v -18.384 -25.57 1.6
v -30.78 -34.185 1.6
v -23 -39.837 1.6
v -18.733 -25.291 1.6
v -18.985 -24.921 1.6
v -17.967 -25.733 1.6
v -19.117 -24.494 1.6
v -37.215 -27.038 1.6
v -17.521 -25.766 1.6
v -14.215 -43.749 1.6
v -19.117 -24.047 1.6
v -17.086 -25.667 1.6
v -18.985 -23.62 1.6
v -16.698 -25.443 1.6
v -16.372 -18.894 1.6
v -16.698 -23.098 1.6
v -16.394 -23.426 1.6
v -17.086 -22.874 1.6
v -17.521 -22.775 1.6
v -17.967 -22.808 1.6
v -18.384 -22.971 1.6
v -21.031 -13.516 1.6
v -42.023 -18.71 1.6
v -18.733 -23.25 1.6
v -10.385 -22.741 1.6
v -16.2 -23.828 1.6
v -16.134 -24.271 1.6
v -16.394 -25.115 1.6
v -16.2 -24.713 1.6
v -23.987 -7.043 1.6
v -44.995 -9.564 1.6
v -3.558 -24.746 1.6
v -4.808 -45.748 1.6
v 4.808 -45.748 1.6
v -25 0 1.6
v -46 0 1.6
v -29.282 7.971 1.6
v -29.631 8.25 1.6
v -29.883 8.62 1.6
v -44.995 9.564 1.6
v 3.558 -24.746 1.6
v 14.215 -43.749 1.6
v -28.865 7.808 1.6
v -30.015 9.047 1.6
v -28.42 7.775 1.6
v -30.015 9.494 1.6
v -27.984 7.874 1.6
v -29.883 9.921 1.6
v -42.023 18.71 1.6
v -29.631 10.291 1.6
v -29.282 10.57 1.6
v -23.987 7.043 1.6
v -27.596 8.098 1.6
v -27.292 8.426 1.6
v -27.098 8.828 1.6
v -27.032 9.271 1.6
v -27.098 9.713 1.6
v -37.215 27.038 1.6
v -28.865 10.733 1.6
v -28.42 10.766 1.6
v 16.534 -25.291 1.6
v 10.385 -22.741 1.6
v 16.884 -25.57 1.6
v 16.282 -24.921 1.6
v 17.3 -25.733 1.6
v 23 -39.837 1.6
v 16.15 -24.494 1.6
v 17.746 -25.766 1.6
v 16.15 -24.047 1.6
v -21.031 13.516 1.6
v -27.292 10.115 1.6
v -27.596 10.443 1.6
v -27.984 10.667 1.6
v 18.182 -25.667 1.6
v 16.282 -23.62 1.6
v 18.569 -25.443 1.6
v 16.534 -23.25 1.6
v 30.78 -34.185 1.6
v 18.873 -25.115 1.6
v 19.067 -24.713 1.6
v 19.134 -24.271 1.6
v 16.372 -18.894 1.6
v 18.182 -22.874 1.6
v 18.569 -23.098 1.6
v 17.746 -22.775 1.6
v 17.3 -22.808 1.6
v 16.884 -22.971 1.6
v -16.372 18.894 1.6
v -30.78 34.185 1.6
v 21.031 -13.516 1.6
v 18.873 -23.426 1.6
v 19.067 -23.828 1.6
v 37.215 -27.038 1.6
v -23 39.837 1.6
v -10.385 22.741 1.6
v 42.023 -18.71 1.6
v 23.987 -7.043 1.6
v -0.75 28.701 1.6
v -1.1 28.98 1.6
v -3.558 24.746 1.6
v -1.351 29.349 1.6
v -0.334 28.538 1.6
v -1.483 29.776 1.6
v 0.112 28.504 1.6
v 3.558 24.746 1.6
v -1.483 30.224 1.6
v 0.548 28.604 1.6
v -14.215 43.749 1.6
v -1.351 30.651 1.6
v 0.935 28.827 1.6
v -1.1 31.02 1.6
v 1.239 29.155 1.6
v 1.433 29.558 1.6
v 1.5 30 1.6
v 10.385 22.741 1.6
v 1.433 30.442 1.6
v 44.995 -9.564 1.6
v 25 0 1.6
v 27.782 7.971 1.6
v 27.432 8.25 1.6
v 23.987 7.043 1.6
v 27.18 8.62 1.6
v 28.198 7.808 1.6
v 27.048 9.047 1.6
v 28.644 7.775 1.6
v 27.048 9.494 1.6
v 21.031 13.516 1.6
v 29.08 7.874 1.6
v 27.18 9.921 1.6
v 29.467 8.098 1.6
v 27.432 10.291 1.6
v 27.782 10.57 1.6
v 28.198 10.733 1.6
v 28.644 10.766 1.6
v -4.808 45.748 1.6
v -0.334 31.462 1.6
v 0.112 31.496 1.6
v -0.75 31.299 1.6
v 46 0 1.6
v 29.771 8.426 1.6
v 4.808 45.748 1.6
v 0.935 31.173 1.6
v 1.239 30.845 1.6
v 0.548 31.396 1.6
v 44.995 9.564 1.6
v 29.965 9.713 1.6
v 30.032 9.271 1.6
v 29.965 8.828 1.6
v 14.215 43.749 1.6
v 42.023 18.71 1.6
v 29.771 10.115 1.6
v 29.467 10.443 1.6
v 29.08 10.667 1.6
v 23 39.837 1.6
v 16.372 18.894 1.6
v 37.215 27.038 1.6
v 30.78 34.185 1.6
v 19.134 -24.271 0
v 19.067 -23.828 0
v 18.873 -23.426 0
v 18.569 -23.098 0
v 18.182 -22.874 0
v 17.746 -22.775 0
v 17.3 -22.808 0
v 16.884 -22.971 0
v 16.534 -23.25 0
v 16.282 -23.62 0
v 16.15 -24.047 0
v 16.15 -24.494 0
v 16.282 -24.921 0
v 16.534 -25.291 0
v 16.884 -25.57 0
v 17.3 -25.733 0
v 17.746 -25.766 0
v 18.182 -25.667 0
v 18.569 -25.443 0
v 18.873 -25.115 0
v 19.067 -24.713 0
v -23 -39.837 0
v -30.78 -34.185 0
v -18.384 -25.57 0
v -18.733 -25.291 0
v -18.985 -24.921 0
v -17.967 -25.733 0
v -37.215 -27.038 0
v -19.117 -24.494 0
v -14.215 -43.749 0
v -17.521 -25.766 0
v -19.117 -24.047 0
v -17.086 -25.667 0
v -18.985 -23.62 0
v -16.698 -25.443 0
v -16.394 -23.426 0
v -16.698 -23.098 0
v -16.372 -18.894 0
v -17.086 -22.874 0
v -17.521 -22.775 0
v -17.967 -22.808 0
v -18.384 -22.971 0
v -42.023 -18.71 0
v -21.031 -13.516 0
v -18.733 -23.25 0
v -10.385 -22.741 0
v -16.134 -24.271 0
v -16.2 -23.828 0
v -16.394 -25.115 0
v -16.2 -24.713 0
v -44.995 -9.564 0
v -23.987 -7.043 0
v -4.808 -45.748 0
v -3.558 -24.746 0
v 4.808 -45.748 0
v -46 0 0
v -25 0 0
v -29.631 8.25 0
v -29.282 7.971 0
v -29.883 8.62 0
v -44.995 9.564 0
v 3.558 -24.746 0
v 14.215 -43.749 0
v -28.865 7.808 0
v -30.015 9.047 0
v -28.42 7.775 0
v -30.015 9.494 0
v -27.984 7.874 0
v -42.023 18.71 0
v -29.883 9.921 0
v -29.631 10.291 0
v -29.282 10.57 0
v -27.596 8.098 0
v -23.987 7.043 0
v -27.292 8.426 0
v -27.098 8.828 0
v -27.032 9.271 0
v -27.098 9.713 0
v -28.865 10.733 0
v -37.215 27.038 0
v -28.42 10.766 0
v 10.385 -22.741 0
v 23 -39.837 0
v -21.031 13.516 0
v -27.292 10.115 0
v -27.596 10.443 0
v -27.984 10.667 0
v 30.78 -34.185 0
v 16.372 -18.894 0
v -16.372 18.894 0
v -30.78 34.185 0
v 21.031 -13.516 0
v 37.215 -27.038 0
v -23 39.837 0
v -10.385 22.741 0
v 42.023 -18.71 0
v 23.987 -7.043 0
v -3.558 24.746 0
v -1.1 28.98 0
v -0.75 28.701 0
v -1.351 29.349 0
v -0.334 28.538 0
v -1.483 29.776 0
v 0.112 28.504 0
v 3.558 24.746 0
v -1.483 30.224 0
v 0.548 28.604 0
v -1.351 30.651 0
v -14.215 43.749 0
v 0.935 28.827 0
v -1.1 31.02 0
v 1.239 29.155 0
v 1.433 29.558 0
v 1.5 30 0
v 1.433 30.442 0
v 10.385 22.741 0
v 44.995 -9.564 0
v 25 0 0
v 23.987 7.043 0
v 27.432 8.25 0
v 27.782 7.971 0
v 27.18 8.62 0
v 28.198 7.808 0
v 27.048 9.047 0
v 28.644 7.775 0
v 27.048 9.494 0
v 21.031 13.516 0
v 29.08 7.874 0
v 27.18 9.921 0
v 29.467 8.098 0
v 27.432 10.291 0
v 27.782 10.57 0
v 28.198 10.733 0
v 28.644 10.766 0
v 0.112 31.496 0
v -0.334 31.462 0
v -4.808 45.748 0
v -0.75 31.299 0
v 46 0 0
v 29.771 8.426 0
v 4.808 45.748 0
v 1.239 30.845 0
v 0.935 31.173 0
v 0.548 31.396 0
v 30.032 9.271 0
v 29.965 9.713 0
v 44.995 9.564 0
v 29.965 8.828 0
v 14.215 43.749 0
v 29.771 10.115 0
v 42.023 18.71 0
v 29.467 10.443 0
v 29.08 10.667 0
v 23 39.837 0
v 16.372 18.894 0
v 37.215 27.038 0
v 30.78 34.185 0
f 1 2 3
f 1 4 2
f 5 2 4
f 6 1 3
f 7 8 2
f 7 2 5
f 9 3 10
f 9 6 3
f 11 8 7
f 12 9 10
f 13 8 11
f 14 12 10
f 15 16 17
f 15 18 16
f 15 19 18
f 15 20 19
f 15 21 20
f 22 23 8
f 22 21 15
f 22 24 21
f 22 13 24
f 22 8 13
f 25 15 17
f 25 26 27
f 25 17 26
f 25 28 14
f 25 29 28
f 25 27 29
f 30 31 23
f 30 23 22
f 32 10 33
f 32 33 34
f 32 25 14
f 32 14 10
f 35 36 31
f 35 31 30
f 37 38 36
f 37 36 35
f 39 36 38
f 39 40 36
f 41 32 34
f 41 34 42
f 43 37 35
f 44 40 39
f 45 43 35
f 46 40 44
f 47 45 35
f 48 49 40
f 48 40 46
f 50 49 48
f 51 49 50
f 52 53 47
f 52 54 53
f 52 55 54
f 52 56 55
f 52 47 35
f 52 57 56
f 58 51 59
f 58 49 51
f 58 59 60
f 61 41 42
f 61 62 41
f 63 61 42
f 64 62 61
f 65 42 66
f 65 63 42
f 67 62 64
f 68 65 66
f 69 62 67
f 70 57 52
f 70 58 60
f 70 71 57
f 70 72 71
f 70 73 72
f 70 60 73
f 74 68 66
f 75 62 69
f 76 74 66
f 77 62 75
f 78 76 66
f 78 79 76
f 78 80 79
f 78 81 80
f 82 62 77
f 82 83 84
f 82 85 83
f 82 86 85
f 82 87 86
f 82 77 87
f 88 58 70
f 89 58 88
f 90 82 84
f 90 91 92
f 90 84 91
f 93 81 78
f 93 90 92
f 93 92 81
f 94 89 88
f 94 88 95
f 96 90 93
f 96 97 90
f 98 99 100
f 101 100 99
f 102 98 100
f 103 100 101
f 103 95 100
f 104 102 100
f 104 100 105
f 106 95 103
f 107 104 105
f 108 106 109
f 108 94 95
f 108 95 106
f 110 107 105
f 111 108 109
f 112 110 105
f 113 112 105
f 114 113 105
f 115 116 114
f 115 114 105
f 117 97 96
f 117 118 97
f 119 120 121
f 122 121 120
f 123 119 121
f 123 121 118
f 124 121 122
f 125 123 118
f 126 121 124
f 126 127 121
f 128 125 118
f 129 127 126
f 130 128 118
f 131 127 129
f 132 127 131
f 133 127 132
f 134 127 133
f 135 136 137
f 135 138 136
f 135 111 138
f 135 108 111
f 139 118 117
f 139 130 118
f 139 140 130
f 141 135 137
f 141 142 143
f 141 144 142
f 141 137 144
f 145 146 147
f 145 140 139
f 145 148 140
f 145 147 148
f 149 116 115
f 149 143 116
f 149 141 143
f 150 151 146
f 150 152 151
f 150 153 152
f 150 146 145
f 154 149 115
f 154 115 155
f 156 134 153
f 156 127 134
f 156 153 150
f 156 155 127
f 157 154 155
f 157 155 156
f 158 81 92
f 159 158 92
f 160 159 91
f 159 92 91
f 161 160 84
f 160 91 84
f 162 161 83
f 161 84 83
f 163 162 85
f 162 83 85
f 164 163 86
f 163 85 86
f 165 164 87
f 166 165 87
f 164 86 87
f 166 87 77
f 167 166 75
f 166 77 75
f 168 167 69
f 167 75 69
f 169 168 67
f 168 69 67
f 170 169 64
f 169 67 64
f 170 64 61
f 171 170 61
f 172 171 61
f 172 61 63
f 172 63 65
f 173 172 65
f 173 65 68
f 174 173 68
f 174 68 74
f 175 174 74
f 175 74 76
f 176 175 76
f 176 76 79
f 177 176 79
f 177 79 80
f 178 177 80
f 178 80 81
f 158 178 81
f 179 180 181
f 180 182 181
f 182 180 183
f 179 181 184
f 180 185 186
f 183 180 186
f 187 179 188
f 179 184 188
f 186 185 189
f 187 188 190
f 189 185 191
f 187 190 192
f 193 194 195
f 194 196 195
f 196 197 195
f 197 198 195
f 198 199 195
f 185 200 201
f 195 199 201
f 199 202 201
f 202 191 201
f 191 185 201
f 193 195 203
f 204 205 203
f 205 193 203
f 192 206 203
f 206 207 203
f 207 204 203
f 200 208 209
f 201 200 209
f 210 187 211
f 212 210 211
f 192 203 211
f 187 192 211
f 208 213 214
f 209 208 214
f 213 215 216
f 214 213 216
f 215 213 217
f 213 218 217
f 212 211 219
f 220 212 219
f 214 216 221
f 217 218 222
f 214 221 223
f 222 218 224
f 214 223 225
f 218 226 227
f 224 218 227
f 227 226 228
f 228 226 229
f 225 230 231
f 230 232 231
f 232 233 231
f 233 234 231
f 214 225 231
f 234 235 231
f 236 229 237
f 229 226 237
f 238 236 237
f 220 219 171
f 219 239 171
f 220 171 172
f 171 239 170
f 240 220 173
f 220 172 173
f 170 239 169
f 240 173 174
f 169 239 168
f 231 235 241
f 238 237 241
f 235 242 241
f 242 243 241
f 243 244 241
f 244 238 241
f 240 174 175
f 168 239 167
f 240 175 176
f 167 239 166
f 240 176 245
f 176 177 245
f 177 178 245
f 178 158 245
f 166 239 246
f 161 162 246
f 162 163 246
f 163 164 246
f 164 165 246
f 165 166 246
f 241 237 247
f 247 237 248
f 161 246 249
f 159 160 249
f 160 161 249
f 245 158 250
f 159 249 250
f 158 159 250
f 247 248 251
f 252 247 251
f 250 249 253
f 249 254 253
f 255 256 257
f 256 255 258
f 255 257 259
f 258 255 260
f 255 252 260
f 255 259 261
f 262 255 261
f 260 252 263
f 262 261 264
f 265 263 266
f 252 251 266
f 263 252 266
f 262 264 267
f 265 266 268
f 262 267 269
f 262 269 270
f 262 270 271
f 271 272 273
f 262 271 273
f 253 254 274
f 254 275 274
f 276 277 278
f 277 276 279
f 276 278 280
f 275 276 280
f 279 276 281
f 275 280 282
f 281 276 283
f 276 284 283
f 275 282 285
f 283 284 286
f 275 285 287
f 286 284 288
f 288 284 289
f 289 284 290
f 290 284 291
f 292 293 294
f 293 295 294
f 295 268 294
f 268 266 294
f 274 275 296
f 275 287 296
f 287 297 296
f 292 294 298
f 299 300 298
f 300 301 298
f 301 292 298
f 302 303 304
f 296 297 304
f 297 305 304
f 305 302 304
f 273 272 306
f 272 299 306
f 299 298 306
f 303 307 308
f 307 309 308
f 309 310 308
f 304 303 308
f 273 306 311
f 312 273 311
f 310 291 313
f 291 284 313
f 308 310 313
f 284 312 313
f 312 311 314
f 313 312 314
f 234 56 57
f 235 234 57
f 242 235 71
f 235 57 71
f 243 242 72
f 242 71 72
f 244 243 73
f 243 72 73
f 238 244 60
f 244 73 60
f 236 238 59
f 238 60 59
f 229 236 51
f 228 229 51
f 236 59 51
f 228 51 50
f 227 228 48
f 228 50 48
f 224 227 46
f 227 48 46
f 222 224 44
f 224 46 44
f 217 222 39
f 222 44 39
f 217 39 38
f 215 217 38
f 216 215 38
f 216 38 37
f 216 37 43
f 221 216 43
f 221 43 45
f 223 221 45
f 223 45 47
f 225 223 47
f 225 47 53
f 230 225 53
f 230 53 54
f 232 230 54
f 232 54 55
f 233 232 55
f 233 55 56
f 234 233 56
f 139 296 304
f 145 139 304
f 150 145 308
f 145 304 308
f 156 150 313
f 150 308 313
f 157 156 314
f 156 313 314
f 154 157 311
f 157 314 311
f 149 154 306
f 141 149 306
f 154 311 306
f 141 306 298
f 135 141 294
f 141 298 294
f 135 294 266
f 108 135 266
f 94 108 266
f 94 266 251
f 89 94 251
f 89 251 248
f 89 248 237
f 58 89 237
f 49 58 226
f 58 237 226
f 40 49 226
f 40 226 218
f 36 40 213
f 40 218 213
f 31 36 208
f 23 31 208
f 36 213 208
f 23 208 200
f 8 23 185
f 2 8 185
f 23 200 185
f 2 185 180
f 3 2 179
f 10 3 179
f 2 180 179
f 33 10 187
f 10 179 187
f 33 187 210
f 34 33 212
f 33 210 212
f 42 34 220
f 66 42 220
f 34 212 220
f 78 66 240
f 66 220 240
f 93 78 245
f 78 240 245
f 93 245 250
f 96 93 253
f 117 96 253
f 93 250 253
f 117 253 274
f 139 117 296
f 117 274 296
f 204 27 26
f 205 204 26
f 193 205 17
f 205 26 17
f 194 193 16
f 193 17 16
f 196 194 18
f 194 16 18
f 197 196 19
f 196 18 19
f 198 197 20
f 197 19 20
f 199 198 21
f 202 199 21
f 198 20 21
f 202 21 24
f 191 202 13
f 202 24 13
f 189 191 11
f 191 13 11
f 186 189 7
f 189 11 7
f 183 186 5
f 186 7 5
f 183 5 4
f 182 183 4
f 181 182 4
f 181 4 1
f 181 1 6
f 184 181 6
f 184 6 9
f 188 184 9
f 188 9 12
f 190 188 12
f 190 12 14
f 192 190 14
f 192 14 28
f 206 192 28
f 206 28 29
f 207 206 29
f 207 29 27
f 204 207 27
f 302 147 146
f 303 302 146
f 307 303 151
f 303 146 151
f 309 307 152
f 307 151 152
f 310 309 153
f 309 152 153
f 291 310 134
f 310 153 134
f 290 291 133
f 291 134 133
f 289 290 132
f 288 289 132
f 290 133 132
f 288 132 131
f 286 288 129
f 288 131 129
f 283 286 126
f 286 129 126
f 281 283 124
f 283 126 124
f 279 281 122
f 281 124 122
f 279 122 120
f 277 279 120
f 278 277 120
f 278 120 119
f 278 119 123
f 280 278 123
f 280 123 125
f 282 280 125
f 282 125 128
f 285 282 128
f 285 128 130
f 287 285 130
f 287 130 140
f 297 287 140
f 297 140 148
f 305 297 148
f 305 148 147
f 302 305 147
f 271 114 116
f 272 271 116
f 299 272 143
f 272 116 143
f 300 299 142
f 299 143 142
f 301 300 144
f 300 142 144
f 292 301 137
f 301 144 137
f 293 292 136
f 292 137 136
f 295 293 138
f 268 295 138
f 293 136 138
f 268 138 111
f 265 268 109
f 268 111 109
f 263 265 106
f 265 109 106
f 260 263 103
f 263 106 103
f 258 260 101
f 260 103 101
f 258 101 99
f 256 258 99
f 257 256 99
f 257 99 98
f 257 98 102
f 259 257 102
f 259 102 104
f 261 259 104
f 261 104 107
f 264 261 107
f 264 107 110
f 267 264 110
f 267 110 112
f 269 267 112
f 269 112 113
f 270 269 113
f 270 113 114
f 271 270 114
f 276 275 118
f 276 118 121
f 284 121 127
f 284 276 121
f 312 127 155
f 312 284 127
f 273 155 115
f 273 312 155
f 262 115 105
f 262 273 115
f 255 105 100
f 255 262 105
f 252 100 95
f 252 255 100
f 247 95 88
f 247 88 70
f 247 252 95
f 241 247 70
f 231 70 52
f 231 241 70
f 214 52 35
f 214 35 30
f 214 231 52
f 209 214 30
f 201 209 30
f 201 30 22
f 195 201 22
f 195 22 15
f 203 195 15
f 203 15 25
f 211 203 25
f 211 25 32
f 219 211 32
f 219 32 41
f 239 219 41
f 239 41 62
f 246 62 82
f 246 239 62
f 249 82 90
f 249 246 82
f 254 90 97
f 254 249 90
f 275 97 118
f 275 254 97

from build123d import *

# Parameters (mm, degrees)
F0_R     = 46
F0_R_2   = 25
F1_DEPTH = 1.6
F2_R     = 1.5
F3_DEPTH = 25.4


with BuildPart() as f1:
    # F0 (on Top) → F1 (new body)
    with BuildSketch(Plane.XY):
        Circle(F0_R)
        Circle(F0_R_2, mode=Mode.SUBTRACT)
    extrude(amount=F1_DEPTH)

    # F2 (on face) → F3 (cut)
    with BuildSketch(Plane.XY.offset(1.6)):
        with Locations((0, 30)):
            Circle(F2_R)
        with Locations((-28.531695, 9.27051)):
            Circle(F2_R)
        with Locations((-17.633558, -24.27051)):
            Circle(F2_R)
        with Locations((17.633558, -24.27051)):
            Circle(F2_R)
        with Locations((28.531695, 9.27051)):
            Circle(F2_R)
    extrude(amount=-F3_DEPTH, mode=Mode.SUBTRACT)


solid = f1.part
